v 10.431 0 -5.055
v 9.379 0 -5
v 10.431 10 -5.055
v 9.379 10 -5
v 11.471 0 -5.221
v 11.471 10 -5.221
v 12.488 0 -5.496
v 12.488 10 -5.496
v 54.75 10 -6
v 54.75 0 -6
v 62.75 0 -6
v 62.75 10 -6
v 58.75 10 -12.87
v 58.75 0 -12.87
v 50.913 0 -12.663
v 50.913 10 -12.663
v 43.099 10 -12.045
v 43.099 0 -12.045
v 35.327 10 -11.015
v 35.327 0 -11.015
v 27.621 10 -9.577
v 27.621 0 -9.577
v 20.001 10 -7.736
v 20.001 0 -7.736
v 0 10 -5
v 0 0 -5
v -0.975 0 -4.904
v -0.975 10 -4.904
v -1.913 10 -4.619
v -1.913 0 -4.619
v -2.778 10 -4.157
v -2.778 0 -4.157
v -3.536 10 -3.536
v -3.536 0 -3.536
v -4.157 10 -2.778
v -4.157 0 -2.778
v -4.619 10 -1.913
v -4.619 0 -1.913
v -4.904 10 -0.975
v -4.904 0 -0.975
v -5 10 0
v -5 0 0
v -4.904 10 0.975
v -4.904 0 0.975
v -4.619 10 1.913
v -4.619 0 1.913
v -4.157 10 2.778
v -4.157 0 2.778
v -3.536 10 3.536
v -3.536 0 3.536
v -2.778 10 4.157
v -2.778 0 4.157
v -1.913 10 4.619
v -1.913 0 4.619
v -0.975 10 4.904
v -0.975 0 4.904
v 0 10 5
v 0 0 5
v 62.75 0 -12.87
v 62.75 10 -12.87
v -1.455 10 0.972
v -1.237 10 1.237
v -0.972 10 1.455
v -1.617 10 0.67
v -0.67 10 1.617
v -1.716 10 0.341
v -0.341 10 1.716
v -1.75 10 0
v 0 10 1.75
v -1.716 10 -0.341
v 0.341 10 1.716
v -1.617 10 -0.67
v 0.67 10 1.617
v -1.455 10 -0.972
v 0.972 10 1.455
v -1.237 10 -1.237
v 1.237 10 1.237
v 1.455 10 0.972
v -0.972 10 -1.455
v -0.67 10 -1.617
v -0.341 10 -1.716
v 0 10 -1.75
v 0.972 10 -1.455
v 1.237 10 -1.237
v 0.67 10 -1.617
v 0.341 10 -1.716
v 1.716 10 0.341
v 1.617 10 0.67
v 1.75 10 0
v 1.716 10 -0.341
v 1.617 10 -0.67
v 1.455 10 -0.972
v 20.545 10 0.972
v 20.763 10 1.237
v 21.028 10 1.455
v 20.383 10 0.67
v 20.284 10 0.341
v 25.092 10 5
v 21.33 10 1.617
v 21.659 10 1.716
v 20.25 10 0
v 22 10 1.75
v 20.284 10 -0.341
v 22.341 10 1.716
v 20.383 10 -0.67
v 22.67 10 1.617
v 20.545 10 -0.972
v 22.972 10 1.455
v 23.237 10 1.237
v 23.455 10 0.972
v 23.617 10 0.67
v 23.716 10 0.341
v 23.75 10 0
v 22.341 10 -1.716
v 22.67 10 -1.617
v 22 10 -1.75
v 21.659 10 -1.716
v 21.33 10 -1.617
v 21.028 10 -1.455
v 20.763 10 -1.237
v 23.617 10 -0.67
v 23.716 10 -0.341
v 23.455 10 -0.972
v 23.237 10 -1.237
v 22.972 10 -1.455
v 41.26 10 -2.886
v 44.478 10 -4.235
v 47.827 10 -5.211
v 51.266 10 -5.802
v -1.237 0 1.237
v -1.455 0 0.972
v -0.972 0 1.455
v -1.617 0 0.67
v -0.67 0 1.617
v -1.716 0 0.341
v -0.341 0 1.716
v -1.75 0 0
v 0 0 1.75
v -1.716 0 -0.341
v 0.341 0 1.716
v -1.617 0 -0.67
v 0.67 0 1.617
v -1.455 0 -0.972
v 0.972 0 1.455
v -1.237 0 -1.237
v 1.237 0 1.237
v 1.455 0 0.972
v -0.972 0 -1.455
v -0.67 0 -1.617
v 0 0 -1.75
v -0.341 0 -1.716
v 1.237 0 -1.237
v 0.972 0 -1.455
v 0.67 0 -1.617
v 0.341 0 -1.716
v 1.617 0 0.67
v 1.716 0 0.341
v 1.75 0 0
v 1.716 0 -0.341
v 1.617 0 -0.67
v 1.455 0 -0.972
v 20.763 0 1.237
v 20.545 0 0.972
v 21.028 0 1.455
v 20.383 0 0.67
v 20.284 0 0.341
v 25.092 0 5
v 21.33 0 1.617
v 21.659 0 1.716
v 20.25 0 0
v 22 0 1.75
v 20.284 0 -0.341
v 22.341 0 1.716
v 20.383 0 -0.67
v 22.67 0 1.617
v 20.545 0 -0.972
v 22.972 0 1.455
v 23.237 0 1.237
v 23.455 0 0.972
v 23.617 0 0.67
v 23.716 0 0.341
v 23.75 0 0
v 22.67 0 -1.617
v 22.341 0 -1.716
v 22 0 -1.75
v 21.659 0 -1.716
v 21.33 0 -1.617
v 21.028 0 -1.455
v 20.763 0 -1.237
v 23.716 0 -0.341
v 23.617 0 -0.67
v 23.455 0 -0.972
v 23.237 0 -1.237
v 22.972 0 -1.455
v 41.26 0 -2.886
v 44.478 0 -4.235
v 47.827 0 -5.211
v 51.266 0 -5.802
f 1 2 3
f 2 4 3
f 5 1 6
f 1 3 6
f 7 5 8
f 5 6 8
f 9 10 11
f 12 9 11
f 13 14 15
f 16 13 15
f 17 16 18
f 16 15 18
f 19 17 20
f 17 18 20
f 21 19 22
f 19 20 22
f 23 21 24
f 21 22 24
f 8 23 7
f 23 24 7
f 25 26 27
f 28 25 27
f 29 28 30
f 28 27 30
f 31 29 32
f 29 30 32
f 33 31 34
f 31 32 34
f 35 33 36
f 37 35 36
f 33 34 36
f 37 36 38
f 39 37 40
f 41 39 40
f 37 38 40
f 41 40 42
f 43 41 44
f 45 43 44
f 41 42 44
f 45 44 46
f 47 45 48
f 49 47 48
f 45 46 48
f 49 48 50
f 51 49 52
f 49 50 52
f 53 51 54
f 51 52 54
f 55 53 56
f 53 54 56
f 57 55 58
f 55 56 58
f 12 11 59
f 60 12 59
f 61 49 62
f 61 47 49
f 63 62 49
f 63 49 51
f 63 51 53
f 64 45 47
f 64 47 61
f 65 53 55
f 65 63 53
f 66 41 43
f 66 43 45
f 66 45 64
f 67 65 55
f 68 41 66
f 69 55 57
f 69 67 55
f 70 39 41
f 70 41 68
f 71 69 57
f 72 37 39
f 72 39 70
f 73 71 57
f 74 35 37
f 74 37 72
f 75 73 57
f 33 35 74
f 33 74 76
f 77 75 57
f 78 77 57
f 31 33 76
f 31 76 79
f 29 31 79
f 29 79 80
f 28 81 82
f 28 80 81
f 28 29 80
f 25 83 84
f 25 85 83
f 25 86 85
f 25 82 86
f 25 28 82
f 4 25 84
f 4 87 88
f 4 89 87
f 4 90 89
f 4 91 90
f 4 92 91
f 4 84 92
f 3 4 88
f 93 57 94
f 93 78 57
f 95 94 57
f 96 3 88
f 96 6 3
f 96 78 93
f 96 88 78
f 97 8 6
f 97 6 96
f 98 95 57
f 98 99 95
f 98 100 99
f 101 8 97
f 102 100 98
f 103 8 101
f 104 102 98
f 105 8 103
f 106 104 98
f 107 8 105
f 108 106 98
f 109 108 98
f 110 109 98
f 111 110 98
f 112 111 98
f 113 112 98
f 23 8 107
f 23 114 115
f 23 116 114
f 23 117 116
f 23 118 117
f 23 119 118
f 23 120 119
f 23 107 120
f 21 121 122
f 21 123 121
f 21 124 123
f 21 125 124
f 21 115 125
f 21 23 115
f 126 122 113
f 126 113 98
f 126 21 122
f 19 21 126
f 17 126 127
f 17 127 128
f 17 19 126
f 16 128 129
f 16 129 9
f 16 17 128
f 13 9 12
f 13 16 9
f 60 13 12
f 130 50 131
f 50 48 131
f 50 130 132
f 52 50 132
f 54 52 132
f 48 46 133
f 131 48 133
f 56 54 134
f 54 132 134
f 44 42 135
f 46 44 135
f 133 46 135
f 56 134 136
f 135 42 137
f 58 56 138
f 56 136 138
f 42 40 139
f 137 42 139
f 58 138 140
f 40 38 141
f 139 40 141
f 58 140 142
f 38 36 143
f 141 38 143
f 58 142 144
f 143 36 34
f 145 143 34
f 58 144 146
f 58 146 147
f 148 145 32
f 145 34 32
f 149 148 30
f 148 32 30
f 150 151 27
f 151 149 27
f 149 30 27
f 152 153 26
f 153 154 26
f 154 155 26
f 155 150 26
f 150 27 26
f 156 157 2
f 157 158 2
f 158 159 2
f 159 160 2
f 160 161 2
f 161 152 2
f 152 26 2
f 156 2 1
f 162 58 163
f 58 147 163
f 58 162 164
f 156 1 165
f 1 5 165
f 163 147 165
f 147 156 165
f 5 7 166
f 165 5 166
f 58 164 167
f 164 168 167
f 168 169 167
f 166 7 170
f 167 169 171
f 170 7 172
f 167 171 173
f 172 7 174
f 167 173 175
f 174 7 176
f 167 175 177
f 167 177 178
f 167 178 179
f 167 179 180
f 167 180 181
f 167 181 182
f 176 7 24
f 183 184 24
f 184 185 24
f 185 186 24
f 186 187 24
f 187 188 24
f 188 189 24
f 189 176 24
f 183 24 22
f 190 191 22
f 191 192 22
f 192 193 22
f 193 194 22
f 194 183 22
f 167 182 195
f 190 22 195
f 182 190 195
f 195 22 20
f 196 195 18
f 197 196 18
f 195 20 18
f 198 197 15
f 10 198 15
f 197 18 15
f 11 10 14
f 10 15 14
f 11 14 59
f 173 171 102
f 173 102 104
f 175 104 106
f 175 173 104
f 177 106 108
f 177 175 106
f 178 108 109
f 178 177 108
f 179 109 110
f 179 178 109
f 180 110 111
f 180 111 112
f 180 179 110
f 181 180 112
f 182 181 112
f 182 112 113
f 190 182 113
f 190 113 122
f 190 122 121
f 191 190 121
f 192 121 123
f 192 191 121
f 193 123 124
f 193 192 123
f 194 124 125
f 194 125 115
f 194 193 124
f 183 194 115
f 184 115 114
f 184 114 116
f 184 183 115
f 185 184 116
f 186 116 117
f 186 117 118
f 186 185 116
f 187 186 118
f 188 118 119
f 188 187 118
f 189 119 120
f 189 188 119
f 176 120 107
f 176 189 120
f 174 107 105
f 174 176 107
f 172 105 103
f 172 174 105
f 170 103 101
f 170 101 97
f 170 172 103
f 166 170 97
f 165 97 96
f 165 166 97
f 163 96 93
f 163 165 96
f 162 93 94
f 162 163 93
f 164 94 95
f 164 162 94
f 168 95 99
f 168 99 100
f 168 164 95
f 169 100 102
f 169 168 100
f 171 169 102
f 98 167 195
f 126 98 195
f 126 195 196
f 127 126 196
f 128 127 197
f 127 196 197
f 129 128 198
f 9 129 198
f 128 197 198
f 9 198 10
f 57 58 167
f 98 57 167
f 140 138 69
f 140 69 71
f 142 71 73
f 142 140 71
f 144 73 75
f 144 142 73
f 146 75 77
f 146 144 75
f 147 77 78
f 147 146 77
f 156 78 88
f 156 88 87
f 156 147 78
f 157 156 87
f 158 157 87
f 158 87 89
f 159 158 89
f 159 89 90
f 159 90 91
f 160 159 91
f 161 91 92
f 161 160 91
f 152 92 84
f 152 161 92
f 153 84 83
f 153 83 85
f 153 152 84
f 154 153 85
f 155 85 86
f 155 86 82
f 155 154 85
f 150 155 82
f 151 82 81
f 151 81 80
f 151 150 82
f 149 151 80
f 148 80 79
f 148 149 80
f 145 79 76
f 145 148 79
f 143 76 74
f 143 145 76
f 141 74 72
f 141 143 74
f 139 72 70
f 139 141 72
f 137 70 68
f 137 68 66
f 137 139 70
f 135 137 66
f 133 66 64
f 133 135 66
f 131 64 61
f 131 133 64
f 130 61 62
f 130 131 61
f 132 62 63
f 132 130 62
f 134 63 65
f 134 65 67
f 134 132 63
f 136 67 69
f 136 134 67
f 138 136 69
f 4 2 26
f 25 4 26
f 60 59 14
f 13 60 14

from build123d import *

# Parameters (mm, degrees)
SKETCH_1_R      = 5
SKETCH_1_R_2    = 1.75
EXTRUDE_1_DEPTH = 10
EXTRUDE_START   = -10
EXTRUDE_2_DEPTH = 10
FILLET_1_R      = 10


with BuildPart() as part:
    # 草图1 → 凸台-拉伸1 (new body)
    # profile 1 of 3: a face of its own
    with BuildSketch(Plane(origin=(0, 0, 0), x_dir=(1, 0, 0), z_dir=(0, 1, 0))):
        Circle(SKETCH_1_R)
        with Locations(Location((0, 0, 0), (0, 0, 270))):
            Circle(SKETCH_1_R_2, mode=Mode.SUBTRACT)
    # profile 2 of 3: a face of its own
    with BuildSketch(Plane(origin=(0, 0, 0), x_dir=(1, 0, 0), z_dir=(0, 1, 0))):
        with BuildLine():
            Line((22, 5), (0, 5))
            ThreePointArc((0, 5), (3.535533906, 3.535533906), (5, 0))
            ThreePointArc((5, 0), (3.535533906, -3.535533906), (0, -5))
            Line((0, -5), (22, -5))
            ThreePointArc((22, -5), (17, 0), (22, 5))
        make_face()
    # profile 3 of 3: a face of its own
    with BuildSketch(Plane(origin=(0, 0, 0), x_dir=(1, 0, 0), z_dir=(0, 1, 0))):
        with Locations((22, 0)):
            Circle(SKETCH_1_R)
        with Locations(Location((22, 0, 0), (0, 0, 270))):
            Circle(SKETCH_1_R_2, mode=Mode.SUBTRACT)
    extrude(amount=EXTRUDE_1_DEPTH)

    # 草图2 → 凸台-拉伸2 (add)
    with BuildSketch(Plane(origin=(0, 10, 0), x_dir=(1, 0, 0), z_dir=(0, 1, 0)).offset(EXTRUDE_START)):
        with BuildLine():
            Line((22, -5), (25.0919928, -5))
            Line((25.0919928, -5), (41.259704507, 2.885519882))
            ThreePointArc((41.259704507, 2.885519882), (47.82742716, 5.211272452), (54.75, 6))
            Line((54.75, 6), (62.75, 6))
            Line((62.75, 6), (62.75, 12.87))
            Line((62.75, 12.87), (58.75, 12.87))
            ThreePointArc((58.75, 12.87), (34.552895834, 10.889316888), (11, 5))
            Line((11, 5), (22, 5))
            ThreePointArc((22, 5), (27, 0), (22, -5))
        make_face()
    extrude(amount=EXTRUDE_2_DEPTH)

    # 圆角1
    fillet_1_edges = [part.edges().sort_by_distance(p)[0] for p in [
        (11, 5, -5),
    ]]
    fillet(fillet_1_edges, radius=FILLET_1_R)


solid = part.part
